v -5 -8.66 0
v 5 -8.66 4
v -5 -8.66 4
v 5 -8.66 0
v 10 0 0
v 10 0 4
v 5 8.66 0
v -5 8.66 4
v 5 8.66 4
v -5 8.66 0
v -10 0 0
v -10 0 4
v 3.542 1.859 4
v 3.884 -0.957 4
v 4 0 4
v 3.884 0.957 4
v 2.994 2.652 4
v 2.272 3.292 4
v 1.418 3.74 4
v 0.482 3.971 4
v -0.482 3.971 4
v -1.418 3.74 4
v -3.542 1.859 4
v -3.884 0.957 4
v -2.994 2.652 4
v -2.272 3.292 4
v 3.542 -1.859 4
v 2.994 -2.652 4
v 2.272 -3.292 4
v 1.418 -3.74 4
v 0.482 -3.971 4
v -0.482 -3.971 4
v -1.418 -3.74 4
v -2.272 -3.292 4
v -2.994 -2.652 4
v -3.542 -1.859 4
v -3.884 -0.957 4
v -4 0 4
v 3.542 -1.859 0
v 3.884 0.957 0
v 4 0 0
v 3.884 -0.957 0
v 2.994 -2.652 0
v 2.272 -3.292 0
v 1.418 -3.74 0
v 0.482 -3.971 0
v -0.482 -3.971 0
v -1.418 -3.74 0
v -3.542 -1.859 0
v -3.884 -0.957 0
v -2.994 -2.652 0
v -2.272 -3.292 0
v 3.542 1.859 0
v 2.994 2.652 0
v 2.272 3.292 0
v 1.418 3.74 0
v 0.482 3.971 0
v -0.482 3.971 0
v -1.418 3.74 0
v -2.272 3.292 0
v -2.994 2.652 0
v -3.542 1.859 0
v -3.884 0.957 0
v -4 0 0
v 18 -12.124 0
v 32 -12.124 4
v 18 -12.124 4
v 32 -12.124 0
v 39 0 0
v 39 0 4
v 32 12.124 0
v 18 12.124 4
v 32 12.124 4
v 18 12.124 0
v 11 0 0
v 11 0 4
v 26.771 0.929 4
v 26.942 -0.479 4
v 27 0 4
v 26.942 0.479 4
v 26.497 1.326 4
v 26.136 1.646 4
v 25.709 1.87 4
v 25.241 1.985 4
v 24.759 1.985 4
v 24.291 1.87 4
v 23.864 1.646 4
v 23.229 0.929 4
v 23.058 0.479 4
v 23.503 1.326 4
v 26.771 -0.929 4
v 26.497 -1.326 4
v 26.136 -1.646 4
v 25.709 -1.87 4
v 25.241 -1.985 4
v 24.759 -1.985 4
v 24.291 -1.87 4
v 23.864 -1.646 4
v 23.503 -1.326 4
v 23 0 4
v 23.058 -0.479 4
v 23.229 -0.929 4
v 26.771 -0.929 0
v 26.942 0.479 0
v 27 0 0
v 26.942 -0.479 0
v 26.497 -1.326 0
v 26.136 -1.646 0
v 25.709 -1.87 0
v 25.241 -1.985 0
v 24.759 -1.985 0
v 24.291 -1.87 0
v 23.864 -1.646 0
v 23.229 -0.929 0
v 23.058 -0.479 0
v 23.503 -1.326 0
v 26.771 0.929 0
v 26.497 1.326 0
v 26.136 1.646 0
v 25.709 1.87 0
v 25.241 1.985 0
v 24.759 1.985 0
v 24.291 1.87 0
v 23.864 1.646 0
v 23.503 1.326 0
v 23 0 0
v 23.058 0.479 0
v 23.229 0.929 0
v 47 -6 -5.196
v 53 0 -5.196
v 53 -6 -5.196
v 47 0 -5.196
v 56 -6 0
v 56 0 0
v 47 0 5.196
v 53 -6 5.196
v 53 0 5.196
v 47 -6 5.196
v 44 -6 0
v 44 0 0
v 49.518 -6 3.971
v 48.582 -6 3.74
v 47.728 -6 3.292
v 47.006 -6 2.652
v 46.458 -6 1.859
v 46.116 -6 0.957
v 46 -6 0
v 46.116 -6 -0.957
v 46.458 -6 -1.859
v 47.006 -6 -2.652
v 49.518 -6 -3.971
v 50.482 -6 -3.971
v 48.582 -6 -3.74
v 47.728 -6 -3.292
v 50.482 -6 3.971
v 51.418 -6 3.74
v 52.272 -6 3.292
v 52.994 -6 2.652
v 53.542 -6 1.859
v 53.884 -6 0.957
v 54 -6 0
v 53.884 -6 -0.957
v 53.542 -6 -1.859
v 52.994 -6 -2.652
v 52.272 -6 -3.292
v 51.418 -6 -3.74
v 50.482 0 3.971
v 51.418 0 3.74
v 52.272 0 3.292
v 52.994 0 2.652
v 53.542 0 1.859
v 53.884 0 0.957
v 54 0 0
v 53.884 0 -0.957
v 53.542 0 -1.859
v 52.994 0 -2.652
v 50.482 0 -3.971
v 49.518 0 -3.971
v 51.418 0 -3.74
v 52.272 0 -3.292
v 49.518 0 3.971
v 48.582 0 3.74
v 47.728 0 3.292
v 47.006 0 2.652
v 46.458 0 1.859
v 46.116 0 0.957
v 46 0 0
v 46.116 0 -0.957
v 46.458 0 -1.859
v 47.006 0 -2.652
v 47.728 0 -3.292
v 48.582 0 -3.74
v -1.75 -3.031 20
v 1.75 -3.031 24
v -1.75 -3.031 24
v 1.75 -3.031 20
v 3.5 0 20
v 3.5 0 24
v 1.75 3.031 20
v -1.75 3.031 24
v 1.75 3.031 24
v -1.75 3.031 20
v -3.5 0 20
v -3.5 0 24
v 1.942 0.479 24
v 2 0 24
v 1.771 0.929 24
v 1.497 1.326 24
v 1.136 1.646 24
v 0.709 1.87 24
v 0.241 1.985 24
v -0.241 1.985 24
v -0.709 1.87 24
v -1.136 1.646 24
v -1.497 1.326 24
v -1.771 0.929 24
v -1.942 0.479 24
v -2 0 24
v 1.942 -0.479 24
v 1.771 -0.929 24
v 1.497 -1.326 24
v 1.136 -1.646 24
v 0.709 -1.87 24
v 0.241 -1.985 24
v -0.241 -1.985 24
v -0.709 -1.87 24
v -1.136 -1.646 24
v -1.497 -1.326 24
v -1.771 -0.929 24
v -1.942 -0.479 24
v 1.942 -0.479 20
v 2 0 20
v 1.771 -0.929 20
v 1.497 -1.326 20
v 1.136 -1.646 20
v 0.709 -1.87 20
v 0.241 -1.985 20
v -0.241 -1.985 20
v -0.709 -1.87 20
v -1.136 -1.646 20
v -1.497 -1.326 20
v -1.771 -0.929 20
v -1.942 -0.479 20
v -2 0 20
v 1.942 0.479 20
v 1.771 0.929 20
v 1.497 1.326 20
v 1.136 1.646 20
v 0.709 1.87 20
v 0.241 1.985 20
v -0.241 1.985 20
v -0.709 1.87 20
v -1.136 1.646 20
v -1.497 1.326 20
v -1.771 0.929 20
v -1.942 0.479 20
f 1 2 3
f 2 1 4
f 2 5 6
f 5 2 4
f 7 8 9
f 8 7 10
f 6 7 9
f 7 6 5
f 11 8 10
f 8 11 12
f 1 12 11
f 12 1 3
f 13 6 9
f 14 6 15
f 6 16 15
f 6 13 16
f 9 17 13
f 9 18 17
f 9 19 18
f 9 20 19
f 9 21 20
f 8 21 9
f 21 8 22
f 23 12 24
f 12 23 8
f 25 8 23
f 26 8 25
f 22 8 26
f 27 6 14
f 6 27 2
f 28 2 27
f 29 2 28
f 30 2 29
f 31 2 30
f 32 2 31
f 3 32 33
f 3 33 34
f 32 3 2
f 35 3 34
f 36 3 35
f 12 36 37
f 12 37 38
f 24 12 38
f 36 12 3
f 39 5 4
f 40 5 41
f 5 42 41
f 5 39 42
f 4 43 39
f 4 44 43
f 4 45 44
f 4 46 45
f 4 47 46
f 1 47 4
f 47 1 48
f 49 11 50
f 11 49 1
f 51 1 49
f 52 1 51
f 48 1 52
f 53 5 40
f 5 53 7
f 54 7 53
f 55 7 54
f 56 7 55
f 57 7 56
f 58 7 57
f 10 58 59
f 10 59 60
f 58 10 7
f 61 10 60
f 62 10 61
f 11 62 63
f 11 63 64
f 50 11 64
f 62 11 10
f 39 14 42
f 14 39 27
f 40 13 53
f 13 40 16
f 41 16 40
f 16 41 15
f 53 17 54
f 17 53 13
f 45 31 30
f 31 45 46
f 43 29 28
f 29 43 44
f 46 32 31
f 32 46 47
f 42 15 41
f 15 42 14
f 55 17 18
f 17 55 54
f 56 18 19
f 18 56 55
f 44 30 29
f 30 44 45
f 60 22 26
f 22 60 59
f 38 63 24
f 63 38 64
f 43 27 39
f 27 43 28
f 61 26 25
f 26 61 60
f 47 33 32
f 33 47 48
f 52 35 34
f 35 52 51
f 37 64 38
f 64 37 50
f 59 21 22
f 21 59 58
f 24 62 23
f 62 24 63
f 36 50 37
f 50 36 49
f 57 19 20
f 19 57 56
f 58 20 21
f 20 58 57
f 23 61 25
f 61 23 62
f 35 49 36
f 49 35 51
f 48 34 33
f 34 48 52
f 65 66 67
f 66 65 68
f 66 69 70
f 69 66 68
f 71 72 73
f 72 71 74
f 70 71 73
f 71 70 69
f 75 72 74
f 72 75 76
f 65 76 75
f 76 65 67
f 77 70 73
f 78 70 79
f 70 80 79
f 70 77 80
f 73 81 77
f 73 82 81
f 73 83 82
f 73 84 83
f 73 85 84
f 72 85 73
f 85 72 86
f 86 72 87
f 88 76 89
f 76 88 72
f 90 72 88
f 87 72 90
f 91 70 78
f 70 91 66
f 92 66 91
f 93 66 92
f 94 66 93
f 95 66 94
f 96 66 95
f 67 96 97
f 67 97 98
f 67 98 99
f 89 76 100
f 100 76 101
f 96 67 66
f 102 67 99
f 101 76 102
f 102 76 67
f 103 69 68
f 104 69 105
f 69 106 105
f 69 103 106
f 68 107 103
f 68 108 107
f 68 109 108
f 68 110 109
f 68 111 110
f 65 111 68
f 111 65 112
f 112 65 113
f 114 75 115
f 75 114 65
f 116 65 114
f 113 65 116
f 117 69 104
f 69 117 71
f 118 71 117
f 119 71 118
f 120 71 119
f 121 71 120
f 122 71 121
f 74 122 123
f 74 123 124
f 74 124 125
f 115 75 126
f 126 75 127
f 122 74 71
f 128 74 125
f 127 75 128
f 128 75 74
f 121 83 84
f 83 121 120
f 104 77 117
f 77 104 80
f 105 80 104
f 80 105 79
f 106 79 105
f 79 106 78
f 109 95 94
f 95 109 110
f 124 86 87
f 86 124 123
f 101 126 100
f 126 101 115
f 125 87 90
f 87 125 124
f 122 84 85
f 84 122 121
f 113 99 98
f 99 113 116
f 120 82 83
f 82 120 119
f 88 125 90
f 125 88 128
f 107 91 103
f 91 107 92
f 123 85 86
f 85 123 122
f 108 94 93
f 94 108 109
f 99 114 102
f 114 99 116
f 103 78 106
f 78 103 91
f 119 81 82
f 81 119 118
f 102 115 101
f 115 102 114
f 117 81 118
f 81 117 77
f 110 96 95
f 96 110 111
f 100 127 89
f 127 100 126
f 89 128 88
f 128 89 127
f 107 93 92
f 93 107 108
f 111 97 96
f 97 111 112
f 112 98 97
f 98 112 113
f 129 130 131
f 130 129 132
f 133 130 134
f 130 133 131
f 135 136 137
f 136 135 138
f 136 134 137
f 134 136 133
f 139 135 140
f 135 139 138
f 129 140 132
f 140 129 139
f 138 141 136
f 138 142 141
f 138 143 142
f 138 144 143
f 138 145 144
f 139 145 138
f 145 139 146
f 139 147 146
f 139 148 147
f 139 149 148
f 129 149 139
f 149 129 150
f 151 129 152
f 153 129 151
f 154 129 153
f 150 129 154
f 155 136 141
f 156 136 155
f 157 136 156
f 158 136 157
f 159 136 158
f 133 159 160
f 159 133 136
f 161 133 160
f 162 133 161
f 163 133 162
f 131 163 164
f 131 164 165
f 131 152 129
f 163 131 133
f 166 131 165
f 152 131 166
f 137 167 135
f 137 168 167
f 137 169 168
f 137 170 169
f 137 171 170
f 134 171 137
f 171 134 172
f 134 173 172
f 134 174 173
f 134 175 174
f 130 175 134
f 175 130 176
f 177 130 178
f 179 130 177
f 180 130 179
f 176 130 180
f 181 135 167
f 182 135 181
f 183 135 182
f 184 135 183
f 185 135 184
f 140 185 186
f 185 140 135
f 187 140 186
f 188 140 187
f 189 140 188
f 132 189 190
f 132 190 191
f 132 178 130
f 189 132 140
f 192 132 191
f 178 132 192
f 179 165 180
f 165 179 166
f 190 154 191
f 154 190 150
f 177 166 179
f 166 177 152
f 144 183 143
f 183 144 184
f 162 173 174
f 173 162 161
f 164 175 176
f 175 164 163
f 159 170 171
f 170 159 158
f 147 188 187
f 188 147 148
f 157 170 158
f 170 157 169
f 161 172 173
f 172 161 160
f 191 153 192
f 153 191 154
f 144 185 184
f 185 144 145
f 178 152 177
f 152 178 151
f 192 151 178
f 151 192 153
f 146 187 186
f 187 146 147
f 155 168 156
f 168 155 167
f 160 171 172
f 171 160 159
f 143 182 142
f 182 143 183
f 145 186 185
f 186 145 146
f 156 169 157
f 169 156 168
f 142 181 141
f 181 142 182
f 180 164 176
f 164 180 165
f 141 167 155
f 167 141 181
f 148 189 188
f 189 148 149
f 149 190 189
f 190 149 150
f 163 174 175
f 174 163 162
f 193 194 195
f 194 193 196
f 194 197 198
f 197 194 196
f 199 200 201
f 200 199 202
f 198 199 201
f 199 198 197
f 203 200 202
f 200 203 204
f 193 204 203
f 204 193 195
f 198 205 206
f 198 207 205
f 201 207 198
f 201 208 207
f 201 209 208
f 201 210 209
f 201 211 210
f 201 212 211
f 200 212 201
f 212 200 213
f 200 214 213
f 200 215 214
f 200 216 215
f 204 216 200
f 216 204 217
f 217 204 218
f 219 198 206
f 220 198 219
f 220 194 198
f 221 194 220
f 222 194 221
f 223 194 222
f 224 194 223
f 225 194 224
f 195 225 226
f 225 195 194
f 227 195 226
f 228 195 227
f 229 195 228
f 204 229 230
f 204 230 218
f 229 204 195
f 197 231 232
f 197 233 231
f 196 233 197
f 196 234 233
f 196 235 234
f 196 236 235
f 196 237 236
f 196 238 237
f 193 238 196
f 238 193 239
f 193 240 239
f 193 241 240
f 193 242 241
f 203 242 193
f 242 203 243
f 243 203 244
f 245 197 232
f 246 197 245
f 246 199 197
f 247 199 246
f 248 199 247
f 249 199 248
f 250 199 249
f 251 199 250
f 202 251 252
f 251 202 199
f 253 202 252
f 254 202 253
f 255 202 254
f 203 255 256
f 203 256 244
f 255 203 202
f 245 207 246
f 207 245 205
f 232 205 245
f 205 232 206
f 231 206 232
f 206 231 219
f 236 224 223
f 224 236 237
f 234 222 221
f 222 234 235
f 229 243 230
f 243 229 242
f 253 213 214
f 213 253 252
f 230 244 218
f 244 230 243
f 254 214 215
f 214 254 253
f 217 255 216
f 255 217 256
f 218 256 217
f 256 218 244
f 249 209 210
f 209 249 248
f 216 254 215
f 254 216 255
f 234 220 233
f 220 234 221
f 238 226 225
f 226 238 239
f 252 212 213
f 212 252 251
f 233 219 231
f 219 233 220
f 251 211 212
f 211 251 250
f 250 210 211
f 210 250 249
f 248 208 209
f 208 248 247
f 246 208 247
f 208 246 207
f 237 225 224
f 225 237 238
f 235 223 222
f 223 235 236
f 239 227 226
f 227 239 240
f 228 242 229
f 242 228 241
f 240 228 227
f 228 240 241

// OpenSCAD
//.....................................................
module piulita(raza_exterior, raza_interior, grosime)
{
    difference(){
        cylinder(h = grosime, r = raza_exterior, $fn = 6);
    
        translate ([0, 0, -1]) cylinder(h = grosime + 2, r = raza_interior, $fn = 26);
    }
}
//......................................................
module piulita_M4()
{
   piulita(3.5, 2, 4); 
}
//.....................................................

color ("red") piulita(10, 4, 4);
color ("yellow") translate ([25, 0, 0]) piulita(14, 2, 4);

color("blue") translate ([50, 0, 0]) rotate([90, 0, 0]) piulita(6, 4, 6);

translate ([0, 0, 20]) piulita_M4();
